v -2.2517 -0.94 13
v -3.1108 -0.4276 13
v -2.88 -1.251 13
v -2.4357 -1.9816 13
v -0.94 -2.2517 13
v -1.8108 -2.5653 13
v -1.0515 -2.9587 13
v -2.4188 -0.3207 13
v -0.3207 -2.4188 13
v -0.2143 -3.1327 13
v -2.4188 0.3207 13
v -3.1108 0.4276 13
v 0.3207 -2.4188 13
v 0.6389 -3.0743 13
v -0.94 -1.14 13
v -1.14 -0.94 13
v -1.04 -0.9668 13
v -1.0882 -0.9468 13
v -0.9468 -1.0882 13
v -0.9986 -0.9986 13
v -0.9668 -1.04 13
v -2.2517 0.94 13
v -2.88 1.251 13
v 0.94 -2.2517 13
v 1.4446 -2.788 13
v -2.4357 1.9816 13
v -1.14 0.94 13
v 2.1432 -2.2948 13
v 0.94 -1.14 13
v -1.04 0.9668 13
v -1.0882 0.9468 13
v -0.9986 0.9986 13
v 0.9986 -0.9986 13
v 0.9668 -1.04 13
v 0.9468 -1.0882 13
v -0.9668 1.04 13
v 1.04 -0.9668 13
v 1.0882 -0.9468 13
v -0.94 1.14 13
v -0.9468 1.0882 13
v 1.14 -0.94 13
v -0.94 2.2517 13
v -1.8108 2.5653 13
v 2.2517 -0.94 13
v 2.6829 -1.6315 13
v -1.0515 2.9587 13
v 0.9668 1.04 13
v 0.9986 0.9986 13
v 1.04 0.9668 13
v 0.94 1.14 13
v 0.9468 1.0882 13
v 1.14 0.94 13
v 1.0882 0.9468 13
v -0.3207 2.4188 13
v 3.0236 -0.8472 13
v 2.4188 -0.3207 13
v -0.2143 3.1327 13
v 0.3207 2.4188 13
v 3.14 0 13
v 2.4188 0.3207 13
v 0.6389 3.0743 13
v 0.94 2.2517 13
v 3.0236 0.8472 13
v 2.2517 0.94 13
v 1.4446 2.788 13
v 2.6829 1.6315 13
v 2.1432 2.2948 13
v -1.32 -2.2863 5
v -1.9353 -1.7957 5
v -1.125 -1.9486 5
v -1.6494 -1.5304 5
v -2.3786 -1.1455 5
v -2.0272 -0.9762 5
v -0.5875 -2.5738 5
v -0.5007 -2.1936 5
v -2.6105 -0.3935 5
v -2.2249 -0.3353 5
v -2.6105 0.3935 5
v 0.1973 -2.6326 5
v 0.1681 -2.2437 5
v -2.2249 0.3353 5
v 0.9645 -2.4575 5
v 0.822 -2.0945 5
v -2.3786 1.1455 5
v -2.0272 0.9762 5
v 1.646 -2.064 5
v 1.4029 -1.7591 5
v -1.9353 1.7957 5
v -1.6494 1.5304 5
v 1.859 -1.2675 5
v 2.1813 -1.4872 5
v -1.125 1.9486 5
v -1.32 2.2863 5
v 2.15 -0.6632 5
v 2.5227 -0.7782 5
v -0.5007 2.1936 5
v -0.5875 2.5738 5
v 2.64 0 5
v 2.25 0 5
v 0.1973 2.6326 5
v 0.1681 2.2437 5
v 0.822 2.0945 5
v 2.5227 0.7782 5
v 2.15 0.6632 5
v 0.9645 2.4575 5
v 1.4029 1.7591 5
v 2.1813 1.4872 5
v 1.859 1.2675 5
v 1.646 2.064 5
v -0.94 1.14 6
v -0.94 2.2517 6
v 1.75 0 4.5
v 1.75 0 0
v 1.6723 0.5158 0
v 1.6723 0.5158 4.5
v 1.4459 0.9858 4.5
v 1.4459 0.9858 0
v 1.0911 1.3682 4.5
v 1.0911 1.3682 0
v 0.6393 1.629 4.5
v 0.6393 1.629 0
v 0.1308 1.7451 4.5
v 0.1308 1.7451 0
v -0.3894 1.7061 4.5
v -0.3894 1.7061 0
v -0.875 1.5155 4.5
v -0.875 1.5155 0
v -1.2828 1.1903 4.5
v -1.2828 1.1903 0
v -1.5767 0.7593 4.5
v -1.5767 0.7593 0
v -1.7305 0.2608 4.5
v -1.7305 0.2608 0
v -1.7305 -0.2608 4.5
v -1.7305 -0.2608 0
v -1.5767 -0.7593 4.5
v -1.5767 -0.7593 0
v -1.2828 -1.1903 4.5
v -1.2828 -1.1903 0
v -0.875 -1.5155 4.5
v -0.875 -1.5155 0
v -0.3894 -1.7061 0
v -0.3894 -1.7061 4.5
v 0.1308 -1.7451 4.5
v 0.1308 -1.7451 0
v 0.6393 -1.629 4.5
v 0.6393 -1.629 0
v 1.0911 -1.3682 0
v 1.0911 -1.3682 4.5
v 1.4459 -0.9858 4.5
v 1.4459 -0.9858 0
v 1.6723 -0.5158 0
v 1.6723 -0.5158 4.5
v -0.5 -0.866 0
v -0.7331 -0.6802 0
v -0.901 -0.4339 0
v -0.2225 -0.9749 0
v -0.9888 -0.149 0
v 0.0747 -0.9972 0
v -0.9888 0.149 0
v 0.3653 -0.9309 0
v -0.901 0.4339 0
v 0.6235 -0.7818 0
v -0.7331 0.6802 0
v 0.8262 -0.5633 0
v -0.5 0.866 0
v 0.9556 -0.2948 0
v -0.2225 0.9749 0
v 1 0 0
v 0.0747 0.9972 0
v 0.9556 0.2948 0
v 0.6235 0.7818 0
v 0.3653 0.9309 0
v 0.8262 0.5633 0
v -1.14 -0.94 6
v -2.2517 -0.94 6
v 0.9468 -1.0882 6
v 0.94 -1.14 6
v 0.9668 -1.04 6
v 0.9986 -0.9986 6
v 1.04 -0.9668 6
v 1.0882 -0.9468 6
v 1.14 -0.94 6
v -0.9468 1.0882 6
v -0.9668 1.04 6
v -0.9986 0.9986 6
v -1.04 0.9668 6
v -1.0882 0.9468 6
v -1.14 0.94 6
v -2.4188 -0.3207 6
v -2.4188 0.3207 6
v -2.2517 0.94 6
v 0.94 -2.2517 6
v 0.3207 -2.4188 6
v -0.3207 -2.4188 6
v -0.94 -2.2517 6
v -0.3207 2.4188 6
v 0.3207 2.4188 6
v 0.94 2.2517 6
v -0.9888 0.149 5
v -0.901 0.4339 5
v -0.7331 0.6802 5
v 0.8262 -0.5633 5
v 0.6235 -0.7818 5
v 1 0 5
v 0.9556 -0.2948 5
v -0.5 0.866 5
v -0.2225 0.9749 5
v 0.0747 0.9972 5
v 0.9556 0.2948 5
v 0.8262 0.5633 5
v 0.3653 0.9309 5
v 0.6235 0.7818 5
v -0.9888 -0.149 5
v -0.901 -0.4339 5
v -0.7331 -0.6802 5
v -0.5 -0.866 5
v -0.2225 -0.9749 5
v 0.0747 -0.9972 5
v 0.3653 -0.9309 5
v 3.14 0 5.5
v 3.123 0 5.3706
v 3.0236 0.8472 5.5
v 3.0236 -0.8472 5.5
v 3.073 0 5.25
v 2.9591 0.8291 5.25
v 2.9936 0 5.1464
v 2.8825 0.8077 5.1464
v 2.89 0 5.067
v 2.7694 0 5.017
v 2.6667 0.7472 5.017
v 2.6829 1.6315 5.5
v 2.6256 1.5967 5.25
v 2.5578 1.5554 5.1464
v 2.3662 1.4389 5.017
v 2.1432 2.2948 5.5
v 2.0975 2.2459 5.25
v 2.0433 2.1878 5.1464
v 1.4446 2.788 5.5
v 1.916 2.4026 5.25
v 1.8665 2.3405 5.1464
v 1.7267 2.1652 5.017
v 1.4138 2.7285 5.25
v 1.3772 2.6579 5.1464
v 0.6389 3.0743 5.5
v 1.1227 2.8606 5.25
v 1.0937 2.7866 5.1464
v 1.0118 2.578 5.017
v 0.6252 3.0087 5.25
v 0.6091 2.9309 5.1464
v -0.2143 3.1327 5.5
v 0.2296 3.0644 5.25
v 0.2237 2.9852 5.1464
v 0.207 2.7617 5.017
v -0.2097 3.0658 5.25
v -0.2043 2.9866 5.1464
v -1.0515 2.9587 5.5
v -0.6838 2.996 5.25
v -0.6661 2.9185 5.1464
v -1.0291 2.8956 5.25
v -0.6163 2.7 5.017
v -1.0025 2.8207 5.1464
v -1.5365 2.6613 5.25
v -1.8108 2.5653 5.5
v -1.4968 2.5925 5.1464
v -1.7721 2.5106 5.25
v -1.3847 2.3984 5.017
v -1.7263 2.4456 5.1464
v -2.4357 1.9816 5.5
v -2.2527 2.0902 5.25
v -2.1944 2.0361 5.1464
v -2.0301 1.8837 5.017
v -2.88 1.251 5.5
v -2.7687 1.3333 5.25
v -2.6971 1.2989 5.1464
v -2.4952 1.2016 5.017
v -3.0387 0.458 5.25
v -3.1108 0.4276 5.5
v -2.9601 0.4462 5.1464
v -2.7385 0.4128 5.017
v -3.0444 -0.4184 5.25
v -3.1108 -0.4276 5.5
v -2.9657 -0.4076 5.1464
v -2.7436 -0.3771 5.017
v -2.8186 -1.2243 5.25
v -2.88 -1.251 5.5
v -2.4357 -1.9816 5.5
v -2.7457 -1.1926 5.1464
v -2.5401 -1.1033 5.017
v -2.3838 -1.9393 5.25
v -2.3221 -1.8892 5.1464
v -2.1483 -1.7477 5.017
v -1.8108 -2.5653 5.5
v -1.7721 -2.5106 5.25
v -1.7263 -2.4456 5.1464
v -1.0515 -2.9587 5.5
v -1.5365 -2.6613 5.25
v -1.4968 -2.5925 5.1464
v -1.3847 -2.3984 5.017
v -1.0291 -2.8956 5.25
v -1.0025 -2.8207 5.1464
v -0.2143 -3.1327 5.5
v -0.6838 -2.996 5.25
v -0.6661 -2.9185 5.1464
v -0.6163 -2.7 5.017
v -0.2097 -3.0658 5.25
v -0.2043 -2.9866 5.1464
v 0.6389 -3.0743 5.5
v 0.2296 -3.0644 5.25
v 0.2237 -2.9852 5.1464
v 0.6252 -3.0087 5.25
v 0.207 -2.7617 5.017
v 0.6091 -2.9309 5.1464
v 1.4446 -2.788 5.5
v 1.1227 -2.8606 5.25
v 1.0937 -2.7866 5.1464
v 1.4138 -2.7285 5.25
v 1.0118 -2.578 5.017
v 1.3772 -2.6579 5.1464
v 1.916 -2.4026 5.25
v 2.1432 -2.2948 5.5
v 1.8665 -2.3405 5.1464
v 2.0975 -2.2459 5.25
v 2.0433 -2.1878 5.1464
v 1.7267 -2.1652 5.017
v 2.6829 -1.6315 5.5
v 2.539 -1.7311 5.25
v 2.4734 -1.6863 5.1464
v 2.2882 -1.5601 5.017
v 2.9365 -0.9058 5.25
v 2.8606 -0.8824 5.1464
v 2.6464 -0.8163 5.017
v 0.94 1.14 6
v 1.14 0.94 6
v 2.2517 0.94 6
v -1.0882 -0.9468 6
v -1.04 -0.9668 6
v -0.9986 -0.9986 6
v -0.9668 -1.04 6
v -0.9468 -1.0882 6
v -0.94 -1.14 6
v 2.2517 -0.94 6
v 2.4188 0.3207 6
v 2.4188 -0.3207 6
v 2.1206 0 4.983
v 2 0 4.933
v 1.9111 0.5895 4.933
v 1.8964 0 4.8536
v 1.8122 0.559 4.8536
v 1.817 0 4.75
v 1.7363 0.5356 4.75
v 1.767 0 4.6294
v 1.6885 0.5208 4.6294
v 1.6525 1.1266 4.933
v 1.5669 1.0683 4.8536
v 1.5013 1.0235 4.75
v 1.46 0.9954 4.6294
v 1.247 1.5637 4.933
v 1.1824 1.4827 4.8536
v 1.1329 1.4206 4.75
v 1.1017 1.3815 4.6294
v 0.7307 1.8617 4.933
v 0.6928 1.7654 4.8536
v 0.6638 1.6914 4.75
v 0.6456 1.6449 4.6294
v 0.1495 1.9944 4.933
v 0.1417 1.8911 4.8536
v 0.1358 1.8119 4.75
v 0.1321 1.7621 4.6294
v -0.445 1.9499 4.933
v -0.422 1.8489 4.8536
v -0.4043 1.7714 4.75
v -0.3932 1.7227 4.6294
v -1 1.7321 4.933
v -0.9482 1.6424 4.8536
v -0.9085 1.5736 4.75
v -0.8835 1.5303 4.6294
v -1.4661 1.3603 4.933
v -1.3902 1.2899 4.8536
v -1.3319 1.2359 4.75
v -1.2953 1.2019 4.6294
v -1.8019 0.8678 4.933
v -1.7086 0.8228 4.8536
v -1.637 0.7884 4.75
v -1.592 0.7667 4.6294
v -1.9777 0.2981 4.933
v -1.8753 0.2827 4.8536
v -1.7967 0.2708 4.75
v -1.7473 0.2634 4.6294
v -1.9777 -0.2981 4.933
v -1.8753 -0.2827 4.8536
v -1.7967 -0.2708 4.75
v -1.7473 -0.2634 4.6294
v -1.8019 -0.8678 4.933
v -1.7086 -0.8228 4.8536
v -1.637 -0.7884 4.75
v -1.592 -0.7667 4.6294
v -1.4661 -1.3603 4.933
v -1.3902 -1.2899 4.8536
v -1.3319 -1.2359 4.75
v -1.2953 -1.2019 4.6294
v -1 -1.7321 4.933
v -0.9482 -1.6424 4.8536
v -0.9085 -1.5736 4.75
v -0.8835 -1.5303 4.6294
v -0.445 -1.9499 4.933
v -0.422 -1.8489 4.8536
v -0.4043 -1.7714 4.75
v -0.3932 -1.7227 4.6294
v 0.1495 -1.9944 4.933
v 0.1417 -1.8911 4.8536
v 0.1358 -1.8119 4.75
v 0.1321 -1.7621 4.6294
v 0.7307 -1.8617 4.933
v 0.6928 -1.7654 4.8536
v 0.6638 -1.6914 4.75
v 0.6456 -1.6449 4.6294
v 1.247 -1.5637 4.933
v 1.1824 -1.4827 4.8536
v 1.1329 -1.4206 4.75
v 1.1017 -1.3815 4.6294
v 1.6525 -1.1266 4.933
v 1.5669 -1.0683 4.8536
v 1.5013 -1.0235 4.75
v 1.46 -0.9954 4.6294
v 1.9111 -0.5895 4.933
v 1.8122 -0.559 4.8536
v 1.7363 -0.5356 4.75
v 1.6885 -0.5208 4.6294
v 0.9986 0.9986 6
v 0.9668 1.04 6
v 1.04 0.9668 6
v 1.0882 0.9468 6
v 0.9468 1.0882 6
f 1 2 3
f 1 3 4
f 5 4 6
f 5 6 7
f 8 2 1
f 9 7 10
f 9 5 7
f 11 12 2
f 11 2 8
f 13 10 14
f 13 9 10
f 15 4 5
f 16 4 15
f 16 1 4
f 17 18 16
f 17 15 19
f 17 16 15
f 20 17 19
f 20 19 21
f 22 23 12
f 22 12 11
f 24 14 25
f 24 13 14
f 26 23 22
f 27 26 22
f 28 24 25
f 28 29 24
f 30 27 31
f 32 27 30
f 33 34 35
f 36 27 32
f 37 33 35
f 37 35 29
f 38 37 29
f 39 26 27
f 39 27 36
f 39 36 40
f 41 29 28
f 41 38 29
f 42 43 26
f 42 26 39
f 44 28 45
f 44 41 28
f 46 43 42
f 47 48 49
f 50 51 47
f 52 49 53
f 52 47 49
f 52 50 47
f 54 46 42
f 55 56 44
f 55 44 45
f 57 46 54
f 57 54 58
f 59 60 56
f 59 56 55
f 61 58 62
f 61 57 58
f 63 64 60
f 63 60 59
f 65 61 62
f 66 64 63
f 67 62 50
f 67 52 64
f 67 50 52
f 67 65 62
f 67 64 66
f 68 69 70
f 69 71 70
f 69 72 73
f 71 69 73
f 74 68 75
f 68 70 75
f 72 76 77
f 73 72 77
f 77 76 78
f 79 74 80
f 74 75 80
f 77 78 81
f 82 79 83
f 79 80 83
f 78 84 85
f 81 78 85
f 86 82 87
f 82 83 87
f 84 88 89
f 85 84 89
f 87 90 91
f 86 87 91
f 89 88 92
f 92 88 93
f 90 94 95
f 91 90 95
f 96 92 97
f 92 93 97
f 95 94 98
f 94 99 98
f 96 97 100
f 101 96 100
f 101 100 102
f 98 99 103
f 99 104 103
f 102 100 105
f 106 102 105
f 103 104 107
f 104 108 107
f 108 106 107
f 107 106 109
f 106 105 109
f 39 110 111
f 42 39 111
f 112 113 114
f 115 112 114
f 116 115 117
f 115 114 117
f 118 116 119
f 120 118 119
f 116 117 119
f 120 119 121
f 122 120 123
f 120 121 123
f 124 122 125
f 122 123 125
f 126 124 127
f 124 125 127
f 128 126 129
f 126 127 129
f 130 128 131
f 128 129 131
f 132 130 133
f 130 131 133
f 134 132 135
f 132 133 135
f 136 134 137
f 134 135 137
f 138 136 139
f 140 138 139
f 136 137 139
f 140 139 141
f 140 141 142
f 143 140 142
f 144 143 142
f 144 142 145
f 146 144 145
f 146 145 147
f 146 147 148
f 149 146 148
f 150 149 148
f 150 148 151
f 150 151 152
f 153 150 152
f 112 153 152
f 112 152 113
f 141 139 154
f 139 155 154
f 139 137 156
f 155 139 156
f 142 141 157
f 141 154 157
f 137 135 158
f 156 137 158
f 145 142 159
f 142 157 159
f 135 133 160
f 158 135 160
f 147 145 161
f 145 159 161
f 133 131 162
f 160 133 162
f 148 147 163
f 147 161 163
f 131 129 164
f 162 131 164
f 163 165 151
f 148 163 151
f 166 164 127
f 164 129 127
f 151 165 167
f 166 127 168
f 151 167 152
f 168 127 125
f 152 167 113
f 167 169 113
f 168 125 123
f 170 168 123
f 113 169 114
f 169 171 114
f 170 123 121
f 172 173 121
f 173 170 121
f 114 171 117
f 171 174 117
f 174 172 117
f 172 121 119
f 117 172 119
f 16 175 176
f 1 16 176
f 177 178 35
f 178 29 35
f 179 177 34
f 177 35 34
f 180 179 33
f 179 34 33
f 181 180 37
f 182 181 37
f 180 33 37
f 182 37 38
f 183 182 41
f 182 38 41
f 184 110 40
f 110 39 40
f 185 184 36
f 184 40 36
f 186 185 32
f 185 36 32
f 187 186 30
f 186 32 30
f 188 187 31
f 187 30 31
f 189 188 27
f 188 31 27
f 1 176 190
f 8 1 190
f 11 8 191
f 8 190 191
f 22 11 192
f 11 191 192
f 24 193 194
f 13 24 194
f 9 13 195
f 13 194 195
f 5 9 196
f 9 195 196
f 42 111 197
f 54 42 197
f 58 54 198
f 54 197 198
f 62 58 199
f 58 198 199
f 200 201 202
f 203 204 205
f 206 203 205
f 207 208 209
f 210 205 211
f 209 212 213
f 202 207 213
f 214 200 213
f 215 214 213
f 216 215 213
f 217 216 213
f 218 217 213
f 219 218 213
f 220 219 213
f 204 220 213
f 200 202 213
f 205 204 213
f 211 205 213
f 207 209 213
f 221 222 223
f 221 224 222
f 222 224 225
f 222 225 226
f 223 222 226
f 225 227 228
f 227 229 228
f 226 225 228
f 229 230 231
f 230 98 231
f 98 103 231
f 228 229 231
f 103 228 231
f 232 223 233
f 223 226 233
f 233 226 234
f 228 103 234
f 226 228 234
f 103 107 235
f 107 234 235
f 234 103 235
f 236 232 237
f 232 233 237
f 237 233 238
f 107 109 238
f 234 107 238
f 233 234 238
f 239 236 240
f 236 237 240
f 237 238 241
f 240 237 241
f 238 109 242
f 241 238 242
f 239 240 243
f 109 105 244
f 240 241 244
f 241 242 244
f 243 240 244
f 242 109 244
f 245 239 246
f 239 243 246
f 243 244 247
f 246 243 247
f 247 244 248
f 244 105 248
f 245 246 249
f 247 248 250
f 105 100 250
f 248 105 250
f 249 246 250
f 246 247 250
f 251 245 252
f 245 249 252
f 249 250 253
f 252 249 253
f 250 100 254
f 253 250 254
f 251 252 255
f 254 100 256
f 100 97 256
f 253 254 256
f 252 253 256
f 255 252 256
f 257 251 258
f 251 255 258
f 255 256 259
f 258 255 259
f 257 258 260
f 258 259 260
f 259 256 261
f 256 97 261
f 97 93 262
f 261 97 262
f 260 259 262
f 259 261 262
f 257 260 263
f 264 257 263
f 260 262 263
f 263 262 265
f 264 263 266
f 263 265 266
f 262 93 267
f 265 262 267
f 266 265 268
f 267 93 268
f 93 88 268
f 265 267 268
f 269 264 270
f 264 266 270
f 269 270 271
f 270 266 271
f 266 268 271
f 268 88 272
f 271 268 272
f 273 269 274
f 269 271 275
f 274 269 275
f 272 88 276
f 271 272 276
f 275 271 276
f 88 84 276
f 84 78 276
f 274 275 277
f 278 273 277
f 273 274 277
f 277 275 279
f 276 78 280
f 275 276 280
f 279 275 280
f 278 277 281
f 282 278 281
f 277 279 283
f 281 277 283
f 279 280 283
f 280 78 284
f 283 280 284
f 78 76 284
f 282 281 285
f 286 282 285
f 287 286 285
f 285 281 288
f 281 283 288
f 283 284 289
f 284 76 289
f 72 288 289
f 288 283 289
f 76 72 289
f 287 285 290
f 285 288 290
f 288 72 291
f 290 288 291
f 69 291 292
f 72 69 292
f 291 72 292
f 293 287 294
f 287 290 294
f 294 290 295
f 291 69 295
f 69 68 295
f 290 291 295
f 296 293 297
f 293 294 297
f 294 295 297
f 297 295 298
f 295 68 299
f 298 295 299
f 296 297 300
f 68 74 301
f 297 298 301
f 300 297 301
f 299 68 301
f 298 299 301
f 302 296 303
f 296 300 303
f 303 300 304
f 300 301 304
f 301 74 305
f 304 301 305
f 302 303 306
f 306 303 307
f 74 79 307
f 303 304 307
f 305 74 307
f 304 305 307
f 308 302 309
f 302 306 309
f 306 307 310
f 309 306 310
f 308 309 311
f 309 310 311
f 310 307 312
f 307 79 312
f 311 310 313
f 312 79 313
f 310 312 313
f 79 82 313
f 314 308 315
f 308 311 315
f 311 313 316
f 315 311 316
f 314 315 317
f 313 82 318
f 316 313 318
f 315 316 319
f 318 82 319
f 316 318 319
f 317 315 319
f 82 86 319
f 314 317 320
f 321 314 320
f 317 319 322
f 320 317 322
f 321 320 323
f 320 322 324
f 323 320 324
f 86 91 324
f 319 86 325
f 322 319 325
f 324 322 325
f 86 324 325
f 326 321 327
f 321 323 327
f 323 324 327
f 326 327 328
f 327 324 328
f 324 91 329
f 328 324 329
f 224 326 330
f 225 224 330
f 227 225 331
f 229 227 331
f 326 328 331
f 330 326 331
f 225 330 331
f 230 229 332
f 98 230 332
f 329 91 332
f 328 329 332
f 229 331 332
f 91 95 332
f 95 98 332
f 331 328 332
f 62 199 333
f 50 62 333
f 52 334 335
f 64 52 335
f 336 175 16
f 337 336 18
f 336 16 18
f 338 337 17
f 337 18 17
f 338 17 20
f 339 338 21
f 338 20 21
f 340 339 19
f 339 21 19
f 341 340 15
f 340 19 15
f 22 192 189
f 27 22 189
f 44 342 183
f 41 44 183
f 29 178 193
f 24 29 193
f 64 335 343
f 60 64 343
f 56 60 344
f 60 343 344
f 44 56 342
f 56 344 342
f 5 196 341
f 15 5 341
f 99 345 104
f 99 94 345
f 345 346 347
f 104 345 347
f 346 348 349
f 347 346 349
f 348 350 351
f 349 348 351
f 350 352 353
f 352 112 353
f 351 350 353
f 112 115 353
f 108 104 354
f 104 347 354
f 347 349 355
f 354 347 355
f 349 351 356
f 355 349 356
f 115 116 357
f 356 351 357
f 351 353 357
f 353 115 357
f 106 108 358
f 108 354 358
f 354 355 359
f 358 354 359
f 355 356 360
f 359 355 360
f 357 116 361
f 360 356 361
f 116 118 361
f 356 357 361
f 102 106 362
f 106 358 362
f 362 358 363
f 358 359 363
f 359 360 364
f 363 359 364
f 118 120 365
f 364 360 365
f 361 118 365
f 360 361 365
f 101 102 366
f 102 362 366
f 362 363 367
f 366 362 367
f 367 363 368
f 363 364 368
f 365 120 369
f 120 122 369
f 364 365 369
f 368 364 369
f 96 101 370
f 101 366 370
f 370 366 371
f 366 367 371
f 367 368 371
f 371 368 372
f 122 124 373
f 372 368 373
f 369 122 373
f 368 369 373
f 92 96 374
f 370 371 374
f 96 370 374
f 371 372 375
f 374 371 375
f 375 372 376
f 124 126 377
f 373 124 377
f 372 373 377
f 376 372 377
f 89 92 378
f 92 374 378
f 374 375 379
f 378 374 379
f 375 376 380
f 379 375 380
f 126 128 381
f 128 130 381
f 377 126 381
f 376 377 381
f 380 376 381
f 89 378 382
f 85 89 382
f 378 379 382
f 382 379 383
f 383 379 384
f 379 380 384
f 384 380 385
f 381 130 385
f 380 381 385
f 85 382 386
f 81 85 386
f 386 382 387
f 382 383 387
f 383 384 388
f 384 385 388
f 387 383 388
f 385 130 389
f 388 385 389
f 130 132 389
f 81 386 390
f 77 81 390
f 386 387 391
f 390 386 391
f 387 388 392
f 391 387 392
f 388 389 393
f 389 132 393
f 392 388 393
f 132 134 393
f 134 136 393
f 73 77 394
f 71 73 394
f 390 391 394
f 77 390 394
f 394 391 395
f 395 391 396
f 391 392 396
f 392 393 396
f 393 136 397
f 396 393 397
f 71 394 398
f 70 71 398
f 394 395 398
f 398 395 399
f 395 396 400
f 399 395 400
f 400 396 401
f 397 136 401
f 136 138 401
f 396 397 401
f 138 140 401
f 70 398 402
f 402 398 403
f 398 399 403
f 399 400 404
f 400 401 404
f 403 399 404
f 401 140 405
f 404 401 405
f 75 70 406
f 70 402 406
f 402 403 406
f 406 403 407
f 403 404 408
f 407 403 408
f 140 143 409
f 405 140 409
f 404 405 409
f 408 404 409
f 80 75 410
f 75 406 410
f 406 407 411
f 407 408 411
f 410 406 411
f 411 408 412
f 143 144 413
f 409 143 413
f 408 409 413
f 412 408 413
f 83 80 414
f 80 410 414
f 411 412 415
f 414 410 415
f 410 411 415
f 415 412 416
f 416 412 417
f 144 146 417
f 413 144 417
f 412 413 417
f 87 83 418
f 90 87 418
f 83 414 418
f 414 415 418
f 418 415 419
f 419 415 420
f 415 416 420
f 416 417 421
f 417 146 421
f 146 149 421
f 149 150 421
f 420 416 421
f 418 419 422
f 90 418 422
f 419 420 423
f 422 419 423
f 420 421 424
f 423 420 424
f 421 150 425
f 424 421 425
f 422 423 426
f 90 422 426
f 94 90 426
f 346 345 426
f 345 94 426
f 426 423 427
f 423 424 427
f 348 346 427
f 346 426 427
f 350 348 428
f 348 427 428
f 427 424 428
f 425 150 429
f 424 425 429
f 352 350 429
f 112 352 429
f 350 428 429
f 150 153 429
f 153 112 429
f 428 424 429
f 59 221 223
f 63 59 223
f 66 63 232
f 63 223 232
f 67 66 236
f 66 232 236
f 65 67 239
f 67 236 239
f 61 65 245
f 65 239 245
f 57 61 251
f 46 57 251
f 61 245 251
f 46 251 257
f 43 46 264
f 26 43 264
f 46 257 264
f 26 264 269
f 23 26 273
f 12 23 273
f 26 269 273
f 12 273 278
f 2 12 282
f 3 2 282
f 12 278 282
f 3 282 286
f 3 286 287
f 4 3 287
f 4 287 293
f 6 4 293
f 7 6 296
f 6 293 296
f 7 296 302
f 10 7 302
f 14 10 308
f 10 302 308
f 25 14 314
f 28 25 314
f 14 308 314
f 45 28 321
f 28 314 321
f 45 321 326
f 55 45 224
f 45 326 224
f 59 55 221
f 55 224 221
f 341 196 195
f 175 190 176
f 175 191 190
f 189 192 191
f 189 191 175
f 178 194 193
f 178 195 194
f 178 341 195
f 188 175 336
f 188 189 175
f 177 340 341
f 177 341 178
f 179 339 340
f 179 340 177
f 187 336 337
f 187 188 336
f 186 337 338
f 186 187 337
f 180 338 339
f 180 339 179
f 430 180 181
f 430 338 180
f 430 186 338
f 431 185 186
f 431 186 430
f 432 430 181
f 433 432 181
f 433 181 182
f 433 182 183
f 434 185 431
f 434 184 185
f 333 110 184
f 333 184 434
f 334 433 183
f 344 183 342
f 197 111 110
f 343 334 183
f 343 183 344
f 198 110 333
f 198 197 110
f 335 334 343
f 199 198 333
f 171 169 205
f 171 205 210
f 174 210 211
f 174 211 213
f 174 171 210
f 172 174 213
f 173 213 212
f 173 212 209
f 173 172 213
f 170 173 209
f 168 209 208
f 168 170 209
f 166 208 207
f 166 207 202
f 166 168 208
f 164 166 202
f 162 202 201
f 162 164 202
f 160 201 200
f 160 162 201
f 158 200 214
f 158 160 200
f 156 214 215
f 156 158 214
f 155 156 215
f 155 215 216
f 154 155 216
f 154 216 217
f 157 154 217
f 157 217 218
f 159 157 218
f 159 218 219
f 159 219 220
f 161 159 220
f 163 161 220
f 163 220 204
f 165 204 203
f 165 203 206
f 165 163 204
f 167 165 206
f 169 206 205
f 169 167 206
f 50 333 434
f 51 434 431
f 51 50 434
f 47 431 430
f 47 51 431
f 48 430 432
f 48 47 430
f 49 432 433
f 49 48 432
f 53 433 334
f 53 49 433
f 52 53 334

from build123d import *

# Parameters (mm, degrees)
SKETCH1_R           = 1.75
SKETCH1_R_2         = 1
BOSS_EXTRUDE1_DEPTH = 5
SKETCH2_R           = 3.14
BOSS_EXTRUDE2_DEPTH = 1
SKETCH2_4_R         = 3.14
BOSS_EXTRUDE3_DEPTH = 8
FILLET1_R           = 0.5
FILLET2_R           = 0.2


with BuildPart() as part:
    # Sketch1 → Boss-Extrude1 (new body)
    with BuildSketch(Plane.XY):
        Circle(SKETCH1_R)
        Circle(SKETCH1_R_2, mode=Mode.SUBTRACT)
    extrude(amount=BOSS_EXTRUDE1_DEPTH)

    # Sketch2 → Boss-Extrude2 (add)
    with BuildSketch(Plane.XY.offset(5)):
        Circle(SKETCH2_R)
    extrude(amount=BOSS_EXTRUDE2_DEPTH)

    # Sketch2<4> → Boss-Extrude3 (add)
    with BuildSketch(Plane.XY.offset(5)):
        Circle(SKETCH2_4_R)
        with BuildLine():
            Line((0.94, 0.94), (2.25166605, 0.94))
            ThreePointArc((2.25166605, 0.94), (2.44, 0), (2.25166605, -0.94))
            Line((2.25166605, -0.94), (0.94, -0.94))
            Line((0.94, -0.94), (0.94, -2.25166605))
            ThreePointArc((0.94, -2.25166605), (0, -2.44), (-0.94, -2.25166605))
            Line((-0.94, -2.25166605), (-0.94, -0.94))
            Line((-0.94, -0.94), (-2.25166605, -0.94))
            ThreePointArc((-2.25166605, -0.94), (-2.44, 0), (-2.25166605, 0.94))
            Line((-2.25166605, 0.94), (-0.94, 0.94))
            Line((-0.94, 0.94), (-0.94, 2.25166605))
            ThreePointArc((-0.94, 2.25166605), (0, 2.44), (0.94, 2.25166605))
            Line((0.94, 2.25166605), (0.94, 0.94))
        make_face(mode=Mode.SUBTRACT)
    extrude(amount=BOSS_EXTRUDE3_DEPTH)

    # Fillet1
    fillet1_edges = [part.edges().sort_by_distance(p)[0] for p in [
        (-3.14, 0, 5),
        (-1.75, 0, 5),
    ]]
    fillet(fillet1_edges, radius=FILLET1_R)

    # Fillet2
    fillet2_edges = [part.edges().sort_by_distance(p)[0] for p in [
        (-0.94, 0.94, 9.5),
        (0.94, 0.94, 9.5),
        (0.94, -0.94, 9.5),
        (-0.94, -0.94, 9.5),
    ]]
    fillet(fillet2_edges, radius=FILLET2_R)


solid = part.part
